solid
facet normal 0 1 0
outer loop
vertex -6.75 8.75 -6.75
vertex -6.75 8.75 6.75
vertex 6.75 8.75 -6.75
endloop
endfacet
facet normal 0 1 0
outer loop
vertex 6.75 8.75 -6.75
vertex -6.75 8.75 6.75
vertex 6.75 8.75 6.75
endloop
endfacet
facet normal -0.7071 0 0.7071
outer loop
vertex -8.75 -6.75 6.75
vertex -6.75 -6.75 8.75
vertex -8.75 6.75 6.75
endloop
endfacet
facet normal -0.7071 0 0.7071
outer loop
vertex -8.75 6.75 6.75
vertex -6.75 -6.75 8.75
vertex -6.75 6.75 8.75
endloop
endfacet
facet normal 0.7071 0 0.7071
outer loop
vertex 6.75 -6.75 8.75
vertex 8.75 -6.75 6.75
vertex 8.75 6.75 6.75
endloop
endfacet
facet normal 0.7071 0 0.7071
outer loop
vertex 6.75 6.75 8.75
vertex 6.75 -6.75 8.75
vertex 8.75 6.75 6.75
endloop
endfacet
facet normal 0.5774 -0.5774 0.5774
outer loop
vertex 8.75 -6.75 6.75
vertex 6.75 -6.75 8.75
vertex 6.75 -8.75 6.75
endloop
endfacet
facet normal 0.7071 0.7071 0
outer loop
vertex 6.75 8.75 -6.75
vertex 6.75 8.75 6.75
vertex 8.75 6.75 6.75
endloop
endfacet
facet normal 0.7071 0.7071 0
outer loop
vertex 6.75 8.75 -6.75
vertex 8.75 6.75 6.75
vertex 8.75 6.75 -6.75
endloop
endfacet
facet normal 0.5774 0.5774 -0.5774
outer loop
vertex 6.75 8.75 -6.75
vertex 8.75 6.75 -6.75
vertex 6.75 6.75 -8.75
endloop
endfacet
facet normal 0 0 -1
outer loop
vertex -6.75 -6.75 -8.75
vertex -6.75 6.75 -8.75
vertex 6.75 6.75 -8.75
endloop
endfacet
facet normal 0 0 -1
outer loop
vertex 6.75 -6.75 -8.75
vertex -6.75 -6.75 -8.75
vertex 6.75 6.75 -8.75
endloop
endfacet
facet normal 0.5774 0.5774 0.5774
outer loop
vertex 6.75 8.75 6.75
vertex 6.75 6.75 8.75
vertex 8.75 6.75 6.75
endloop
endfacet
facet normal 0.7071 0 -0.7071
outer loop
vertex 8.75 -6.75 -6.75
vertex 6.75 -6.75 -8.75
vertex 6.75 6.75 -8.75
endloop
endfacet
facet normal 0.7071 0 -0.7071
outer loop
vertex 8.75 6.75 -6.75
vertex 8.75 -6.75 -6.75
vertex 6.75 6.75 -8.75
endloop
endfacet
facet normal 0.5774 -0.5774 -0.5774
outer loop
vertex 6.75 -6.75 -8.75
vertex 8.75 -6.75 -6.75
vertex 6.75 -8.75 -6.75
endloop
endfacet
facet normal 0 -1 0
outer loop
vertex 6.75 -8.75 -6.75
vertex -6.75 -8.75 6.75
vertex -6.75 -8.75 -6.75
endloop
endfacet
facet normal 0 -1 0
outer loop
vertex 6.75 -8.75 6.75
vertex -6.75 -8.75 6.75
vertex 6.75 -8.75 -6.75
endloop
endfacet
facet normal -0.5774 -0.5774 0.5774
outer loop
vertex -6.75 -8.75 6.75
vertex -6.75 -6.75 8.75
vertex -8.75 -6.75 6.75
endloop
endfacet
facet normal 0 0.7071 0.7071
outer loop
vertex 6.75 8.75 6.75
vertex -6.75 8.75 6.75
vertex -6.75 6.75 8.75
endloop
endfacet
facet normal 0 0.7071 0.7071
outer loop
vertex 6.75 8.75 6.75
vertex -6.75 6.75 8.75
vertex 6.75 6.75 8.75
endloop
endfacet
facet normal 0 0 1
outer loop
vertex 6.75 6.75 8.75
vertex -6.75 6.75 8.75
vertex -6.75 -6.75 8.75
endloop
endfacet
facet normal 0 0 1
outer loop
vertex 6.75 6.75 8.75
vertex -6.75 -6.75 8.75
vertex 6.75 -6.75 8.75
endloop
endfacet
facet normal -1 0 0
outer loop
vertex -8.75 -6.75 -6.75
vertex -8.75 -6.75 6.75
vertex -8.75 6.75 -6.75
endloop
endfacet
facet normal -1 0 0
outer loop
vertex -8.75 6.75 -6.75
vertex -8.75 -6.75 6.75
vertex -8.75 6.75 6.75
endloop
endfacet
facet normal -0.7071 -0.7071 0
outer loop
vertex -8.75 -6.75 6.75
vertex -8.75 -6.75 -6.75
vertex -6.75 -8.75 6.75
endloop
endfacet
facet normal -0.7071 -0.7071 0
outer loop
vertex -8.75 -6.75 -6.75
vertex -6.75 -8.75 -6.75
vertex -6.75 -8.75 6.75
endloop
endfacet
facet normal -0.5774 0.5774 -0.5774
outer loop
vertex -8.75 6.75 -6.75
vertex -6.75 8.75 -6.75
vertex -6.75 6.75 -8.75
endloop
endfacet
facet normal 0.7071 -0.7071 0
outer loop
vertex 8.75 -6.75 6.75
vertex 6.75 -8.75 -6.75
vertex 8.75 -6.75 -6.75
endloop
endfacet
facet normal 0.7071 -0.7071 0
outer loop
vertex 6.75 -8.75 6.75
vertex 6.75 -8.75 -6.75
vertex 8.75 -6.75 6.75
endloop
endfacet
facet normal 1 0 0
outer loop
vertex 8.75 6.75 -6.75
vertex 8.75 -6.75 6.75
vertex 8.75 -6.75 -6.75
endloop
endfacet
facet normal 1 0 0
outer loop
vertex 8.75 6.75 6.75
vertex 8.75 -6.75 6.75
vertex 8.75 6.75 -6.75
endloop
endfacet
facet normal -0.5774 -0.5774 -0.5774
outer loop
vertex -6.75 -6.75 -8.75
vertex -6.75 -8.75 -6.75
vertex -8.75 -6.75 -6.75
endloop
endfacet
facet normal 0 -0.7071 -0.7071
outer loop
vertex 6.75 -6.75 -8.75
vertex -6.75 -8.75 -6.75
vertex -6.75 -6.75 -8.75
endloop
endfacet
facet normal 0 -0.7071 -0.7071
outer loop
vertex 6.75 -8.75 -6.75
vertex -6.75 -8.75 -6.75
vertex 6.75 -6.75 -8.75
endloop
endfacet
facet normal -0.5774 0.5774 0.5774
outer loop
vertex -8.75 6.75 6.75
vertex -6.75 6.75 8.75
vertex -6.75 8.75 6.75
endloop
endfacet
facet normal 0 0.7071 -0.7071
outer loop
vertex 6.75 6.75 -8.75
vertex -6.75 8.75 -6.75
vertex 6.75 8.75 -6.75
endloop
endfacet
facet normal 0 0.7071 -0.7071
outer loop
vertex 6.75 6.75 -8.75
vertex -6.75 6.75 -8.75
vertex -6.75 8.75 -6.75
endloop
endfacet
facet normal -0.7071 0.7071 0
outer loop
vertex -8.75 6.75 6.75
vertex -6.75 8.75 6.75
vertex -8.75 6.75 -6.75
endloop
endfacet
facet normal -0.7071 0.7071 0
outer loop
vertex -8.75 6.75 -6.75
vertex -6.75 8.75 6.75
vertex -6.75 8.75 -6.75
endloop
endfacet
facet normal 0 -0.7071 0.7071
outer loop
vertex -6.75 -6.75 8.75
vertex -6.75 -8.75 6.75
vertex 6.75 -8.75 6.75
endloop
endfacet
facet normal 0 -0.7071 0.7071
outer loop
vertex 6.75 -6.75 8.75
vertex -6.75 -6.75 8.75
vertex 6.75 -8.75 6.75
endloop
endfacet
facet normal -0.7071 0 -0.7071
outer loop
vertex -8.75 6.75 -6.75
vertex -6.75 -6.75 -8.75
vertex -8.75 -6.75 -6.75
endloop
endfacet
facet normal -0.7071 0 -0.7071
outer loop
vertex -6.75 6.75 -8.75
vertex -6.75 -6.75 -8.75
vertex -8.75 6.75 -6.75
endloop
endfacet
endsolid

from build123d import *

# Parameters (mm, degrees)
F0_W     = 17.5
F0_H     = 17.5
F1_DEPTH = 8.75
F2_SIZE  = 2


with BuildPart() as f1:
    # F0 (on Top) → F1 (new body, symmetric)
    with BuildSketch(Plane.XY):
        Rectangle(F0_W, F0_H)
    extrude(amount=F1_DEPTH, both=True)

    # F2
    f2_edges = [f1.edges().sort_by_distance(p)[0] for p in [
        (-8.75, 0, 8.75),
        (0, -8.75, 8.75),
        (8.75, 0, 8.75),
        (0, 8.75, 8.75),
        (8.75, -8.75, 0),
        (8.75, 8.75, 0),
        (8.75, 0, -8.75),
        (0, 8.75, -8.75),
        (-8.75, 8.75, 0),
        (-8.75, -8.75, 0),
        (0, -8.75, -8.75),
        (-8.75, 0, -8.75),
    ]]
    chamfer(f2_edges, length=F2_SIZE)


solid = f1.part
